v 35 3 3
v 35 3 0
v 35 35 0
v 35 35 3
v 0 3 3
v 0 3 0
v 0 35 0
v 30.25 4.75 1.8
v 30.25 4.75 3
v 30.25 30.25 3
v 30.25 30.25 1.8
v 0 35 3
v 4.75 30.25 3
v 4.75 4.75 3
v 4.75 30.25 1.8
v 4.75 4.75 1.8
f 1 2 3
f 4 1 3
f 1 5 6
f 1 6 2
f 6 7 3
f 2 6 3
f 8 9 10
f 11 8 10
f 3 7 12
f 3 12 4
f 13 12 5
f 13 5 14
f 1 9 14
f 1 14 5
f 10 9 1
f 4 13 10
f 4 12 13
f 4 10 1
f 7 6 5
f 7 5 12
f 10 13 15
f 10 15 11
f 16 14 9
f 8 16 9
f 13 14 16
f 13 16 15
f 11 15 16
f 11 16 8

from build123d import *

# Parameters (mm, degrees)
SKETCH1_W           = 35
SKETCH1_H           = 35
BOSS_EXTRUDE1_DEPTH = 3
SKETCH2_W           = 25.5
SKETCH2_H           = 25.5
CUT_EXTRUDE1_DEPTH  = 1.2
SKETCH3_W           = 35
SKETCH3_H           = 3
CUT_EXTRUDE2_DEPTH  = 3


with BuildPart() as part:
    # Sketch1 → Boss-Extrude1 (new body)
    with BuildSketch(Plane.XY):
        with Locations((17.5, 17.5)):
            Rectangle(SKETCH1_W, SKETCH1_H)
    extrude(amount=BOSS_EXTRUDE1_DEPTH)

    # Sketch2 → Cut-Extrude1 (cut)
    with BuildSketch(Plane.XY.offset(3)):
        with Locations((17.5, 17.5)):
            Rectangle(SKETCH2_W, SKETCH2_H)
    extrude(amount=-CUT_EXTRUDE1_DEPTH, mode=Mode.SUBTRACT)

    # Sketch3 → Cut-Extrude2 (cut)
    with BuildSketch(Plane.XZ):
        with Locations((17.5, 1.5)):
            Rectangle(SKETCH3_W, SKETCH3_H)
    extrude(amount=-CUT_EXTRUDE2_DEPTH, mode=Mode.SUBTRACT)


solid = part.part
